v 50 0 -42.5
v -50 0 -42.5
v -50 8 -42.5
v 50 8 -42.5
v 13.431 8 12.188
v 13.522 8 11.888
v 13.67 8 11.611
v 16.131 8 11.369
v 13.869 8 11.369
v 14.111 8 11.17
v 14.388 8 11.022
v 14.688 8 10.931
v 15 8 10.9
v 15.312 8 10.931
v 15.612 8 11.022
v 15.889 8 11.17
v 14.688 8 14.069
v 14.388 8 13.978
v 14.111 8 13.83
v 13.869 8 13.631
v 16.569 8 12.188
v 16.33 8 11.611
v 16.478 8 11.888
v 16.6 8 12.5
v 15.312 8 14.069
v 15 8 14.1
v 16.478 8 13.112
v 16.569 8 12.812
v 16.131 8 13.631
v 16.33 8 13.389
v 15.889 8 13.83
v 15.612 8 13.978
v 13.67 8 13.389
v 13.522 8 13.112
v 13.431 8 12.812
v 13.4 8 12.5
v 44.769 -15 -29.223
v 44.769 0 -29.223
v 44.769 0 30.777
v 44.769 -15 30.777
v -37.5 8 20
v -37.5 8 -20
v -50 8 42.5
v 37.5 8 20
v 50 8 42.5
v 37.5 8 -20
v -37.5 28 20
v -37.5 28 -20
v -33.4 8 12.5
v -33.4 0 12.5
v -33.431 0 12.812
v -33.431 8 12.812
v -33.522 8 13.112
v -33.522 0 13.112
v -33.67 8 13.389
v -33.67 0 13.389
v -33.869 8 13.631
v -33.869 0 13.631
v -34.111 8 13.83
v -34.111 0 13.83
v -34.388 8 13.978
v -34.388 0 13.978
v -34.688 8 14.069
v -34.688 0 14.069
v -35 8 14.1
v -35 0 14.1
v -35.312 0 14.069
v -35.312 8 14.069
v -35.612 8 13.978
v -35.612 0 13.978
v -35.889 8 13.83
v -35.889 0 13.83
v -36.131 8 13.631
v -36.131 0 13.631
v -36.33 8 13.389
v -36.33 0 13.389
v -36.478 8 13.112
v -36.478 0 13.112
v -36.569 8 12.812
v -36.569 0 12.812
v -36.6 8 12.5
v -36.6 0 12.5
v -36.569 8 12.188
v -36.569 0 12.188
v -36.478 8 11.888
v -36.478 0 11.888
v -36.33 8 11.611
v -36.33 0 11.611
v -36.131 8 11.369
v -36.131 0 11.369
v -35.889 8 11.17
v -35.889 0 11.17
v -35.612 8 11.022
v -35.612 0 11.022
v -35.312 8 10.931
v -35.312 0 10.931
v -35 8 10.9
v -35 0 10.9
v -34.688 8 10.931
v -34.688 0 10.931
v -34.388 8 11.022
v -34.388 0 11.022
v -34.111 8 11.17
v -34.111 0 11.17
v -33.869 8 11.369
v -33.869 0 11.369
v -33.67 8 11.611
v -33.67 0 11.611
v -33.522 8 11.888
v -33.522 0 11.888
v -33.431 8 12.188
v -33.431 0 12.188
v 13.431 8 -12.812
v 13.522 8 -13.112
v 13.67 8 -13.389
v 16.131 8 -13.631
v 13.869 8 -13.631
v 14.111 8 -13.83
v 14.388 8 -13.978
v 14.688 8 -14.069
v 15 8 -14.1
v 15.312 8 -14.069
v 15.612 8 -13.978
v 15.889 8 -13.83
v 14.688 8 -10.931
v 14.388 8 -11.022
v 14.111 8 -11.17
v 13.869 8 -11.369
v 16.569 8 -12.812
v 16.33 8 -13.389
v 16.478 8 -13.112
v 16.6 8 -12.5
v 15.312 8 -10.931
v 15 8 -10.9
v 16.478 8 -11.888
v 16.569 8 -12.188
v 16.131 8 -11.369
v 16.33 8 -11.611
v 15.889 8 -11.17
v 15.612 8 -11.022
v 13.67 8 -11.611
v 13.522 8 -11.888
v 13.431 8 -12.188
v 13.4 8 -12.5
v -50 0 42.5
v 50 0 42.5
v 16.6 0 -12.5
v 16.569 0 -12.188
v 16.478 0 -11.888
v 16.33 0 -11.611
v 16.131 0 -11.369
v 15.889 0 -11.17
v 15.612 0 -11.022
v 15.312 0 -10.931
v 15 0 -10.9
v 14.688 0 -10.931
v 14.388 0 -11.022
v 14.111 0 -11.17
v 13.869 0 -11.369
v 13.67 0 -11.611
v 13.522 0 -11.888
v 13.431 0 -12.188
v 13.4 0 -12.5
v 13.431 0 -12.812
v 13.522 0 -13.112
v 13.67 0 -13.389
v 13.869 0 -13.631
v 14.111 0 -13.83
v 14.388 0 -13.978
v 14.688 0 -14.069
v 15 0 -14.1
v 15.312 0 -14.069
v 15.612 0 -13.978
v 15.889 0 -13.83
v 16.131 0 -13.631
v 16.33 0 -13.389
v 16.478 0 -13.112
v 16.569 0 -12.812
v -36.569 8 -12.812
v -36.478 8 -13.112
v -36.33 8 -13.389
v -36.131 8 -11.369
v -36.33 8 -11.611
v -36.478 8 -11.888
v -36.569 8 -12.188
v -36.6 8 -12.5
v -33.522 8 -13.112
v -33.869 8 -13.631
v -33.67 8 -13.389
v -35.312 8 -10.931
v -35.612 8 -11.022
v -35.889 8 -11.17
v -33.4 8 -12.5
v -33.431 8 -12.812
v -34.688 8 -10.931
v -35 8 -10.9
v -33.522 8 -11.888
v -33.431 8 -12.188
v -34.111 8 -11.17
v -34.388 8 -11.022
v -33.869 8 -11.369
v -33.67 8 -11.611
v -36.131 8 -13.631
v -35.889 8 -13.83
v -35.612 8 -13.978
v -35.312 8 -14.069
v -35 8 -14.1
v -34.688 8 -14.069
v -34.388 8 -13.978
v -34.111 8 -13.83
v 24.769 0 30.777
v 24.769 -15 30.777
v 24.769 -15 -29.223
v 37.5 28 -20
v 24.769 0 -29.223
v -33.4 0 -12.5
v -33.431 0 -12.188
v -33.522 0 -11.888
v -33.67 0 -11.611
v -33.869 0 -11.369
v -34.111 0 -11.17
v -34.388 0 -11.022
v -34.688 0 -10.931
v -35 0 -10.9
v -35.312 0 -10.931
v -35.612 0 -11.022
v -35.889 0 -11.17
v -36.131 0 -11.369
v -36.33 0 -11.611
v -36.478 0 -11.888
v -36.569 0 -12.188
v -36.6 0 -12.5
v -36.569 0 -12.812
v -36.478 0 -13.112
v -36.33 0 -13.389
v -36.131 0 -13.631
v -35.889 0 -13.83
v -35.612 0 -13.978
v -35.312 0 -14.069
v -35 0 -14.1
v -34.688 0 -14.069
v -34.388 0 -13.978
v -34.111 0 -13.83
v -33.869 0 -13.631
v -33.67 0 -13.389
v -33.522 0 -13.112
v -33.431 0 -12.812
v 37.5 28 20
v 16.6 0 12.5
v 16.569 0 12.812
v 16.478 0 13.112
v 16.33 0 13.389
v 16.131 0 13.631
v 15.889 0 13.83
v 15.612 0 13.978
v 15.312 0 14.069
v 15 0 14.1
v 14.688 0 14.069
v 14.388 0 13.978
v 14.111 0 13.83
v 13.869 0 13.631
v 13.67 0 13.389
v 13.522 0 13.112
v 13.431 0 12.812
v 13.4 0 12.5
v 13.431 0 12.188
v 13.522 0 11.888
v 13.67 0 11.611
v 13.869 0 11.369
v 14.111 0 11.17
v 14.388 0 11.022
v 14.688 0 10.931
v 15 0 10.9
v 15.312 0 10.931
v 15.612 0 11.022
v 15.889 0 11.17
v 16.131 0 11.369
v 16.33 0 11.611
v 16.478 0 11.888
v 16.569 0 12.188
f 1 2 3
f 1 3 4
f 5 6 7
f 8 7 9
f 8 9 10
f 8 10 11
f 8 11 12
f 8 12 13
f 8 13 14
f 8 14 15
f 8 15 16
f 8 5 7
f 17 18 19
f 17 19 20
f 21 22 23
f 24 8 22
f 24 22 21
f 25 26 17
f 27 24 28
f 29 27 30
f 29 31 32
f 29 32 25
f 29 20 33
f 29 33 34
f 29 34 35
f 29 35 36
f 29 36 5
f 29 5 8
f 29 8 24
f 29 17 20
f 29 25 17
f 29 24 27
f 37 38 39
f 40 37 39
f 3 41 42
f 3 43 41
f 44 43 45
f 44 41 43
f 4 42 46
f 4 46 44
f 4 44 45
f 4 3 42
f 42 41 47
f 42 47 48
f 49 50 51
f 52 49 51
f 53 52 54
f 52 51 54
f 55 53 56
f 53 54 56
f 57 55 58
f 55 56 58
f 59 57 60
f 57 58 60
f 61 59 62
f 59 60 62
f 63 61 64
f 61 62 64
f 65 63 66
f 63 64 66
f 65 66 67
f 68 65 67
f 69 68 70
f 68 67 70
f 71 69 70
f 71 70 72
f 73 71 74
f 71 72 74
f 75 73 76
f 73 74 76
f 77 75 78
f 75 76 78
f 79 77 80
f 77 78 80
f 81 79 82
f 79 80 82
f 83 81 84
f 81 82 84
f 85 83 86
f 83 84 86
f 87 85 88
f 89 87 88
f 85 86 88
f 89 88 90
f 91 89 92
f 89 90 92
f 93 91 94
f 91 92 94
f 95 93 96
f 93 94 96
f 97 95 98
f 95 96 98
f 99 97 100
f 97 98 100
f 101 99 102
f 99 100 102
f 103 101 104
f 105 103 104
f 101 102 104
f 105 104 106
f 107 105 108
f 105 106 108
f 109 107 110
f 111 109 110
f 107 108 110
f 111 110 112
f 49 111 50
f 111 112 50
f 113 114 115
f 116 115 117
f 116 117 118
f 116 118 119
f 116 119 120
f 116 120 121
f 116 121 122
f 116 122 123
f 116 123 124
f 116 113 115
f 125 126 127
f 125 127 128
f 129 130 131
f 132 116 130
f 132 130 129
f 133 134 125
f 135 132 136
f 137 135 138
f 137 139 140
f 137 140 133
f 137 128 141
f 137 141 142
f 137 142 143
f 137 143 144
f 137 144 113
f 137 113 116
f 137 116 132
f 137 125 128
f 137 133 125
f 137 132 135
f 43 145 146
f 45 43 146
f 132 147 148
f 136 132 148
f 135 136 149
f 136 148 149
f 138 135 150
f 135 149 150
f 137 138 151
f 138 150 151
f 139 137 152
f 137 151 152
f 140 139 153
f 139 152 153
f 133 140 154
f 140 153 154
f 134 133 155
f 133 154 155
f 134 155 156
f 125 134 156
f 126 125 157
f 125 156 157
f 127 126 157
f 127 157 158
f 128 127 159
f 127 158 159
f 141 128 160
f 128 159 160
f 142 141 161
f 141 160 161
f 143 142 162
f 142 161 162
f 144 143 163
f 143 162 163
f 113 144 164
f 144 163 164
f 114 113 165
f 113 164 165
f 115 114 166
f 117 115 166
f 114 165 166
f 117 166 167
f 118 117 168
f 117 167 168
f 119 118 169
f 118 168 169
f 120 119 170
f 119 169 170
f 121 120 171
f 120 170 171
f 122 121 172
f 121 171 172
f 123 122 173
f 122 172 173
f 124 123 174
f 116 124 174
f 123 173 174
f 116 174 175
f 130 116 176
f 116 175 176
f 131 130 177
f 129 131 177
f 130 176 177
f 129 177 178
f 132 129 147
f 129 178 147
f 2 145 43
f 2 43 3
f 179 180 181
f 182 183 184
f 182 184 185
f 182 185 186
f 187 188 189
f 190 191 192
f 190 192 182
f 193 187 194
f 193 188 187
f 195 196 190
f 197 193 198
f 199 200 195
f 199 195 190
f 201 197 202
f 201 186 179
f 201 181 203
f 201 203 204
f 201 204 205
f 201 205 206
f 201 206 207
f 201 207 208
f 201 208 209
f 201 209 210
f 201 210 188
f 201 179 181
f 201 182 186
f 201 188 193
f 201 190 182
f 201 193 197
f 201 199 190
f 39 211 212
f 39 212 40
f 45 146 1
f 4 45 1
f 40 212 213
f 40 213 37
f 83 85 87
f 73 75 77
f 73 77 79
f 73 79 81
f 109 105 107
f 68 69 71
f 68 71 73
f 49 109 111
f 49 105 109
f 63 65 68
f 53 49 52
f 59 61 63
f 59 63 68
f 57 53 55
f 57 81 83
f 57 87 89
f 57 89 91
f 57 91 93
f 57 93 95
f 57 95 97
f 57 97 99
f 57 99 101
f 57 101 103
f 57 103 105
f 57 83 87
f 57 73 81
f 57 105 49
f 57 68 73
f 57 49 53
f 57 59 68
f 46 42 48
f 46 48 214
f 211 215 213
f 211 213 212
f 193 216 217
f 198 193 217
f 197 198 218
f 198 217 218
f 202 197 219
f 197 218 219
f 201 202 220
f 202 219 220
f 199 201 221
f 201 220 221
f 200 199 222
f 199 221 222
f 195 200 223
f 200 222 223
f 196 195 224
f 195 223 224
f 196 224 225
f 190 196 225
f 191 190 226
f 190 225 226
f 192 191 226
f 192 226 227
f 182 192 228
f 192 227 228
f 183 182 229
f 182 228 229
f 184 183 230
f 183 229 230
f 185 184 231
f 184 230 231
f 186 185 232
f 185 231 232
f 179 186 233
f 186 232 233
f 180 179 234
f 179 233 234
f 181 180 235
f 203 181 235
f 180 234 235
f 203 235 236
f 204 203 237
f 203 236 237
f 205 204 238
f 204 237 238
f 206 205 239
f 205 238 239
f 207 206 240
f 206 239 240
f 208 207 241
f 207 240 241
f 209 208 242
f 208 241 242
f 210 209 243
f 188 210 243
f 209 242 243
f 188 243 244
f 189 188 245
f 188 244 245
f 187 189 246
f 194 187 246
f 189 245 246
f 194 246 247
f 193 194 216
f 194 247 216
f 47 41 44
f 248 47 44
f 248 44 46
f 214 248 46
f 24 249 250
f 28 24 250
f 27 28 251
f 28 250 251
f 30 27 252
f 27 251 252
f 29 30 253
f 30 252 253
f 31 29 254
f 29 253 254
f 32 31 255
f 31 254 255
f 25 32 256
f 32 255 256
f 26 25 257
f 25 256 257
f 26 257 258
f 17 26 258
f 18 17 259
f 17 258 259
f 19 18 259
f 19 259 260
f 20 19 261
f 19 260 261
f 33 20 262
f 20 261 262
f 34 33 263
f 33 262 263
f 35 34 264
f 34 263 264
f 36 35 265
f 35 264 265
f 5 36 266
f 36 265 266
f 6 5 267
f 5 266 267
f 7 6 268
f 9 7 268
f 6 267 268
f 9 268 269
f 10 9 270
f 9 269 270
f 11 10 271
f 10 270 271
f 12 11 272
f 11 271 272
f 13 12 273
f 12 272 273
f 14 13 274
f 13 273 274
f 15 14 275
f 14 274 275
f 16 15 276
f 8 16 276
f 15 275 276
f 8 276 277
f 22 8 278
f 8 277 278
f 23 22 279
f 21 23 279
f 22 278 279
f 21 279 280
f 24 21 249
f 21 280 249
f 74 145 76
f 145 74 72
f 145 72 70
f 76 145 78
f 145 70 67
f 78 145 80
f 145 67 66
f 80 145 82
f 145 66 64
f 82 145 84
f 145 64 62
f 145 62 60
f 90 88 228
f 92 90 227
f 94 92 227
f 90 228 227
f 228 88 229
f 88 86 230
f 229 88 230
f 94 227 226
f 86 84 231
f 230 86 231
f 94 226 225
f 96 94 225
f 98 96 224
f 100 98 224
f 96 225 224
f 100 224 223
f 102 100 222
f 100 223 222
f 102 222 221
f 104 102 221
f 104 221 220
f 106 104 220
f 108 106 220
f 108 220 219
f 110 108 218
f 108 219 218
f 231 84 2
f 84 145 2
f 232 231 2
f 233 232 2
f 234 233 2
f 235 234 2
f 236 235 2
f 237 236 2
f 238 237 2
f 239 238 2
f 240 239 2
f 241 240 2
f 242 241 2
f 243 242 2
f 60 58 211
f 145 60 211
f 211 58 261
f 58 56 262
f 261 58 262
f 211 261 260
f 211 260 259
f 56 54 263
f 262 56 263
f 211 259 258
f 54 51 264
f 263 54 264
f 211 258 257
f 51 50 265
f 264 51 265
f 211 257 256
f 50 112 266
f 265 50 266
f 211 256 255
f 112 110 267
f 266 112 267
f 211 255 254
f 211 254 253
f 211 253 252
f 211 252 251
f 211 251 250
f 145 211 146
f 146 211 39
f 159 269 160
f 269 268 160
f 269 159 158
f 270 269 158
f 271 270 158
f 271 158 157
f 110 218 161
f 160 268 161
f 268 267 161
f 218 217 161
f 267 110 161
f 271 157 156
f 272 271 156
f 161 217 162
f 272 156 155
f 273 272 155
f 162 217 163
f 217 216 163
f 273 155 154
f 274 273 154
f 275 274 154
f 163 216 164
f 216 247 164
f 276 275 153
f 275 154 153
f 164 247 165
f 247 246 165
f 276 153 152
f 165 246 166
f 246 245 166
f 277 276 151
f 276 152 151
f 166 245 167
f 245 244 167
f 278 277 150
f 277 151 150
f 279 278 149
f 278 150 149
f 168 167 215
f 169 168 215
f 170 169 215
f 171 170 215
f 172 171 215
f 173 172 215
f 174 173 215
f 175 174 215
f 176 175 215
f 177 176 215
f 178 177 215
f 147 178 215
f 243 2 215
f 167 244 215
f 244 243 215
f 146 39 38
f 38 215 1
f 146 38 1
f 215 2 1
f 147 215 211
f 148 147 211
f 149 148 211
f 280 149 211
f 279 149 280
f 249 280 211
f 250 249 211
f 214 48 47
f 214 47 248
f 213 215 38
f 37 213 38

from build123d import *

# Parameters (mm, degrees)
SKETCH_1_W          = 100
SKETCH_1_H          = 85
EXTRUDE_1_DEPTH     = 8
SKETCH_2_W          = 75
SKETCH_2_H          = 40
EXTRUDE_2_DEPTH     = 20
SKETCH_3_W          = 20
SKETCH_3_H          = 60
EXTRUDE_3_DEPTH     = 15
SKETCH_4_R          = 1.6
CUT_EXTRUDE_1_DEPTH = 8


with BuildPart() as part:
    # 草图1 → 凸台-拉伸1 (new body)
    with BuildSketch(Plane(origin=(0, 0, 0), x_dir=(1, 0, 0), z_dir=(0, 1, 0))):
        Rectangle(SKETCH_1_W, SKETCH_1_H)
    extrude(amount=EXTRUDE_1_DEPTH)

    # 草图2 → 凸台-拉伸2 (add)
    with BuildSketch(Plane(origin=(0, 8, 0), x_dir=(1, 0, 0), z_dir=(0, 1, 0))):
        Rectangle(SKETCH_2_W, SKETCH_2_H)
    extrude(amount=EXTRUDE_2_DEPTH)

    # 草图3 → 凸台-拉伸3 (add)
    with BuildSketch(Plane.XZ):
        with Locations((34.768700032, 0.777091897)):
            Rectangle(SKETCH_3_W, SKETCH_3_H)
    extrude(amount=EXTRUDE_3_DEPTH)

    # 草图4 → 切除-拉伸1 (cut)
    with BuildSketch(Plane.XZ):
        with Locations((15, -12.5)):
            Circle(SKETCH_4_R)
        with Locations((15, 12.5)):
            Circle(SKETCH_4_R)
        with Locations((-35, 12.5)):
            Circle(SKETCH_4_R)
        with Locations((-35, -12.5)):
            Circle(SKETCH_4_R)
    extrude(amount=-CUT_EXTRUDE_1_DEPTH, mode=Mode.SUBTRACT)


solid = part.part
